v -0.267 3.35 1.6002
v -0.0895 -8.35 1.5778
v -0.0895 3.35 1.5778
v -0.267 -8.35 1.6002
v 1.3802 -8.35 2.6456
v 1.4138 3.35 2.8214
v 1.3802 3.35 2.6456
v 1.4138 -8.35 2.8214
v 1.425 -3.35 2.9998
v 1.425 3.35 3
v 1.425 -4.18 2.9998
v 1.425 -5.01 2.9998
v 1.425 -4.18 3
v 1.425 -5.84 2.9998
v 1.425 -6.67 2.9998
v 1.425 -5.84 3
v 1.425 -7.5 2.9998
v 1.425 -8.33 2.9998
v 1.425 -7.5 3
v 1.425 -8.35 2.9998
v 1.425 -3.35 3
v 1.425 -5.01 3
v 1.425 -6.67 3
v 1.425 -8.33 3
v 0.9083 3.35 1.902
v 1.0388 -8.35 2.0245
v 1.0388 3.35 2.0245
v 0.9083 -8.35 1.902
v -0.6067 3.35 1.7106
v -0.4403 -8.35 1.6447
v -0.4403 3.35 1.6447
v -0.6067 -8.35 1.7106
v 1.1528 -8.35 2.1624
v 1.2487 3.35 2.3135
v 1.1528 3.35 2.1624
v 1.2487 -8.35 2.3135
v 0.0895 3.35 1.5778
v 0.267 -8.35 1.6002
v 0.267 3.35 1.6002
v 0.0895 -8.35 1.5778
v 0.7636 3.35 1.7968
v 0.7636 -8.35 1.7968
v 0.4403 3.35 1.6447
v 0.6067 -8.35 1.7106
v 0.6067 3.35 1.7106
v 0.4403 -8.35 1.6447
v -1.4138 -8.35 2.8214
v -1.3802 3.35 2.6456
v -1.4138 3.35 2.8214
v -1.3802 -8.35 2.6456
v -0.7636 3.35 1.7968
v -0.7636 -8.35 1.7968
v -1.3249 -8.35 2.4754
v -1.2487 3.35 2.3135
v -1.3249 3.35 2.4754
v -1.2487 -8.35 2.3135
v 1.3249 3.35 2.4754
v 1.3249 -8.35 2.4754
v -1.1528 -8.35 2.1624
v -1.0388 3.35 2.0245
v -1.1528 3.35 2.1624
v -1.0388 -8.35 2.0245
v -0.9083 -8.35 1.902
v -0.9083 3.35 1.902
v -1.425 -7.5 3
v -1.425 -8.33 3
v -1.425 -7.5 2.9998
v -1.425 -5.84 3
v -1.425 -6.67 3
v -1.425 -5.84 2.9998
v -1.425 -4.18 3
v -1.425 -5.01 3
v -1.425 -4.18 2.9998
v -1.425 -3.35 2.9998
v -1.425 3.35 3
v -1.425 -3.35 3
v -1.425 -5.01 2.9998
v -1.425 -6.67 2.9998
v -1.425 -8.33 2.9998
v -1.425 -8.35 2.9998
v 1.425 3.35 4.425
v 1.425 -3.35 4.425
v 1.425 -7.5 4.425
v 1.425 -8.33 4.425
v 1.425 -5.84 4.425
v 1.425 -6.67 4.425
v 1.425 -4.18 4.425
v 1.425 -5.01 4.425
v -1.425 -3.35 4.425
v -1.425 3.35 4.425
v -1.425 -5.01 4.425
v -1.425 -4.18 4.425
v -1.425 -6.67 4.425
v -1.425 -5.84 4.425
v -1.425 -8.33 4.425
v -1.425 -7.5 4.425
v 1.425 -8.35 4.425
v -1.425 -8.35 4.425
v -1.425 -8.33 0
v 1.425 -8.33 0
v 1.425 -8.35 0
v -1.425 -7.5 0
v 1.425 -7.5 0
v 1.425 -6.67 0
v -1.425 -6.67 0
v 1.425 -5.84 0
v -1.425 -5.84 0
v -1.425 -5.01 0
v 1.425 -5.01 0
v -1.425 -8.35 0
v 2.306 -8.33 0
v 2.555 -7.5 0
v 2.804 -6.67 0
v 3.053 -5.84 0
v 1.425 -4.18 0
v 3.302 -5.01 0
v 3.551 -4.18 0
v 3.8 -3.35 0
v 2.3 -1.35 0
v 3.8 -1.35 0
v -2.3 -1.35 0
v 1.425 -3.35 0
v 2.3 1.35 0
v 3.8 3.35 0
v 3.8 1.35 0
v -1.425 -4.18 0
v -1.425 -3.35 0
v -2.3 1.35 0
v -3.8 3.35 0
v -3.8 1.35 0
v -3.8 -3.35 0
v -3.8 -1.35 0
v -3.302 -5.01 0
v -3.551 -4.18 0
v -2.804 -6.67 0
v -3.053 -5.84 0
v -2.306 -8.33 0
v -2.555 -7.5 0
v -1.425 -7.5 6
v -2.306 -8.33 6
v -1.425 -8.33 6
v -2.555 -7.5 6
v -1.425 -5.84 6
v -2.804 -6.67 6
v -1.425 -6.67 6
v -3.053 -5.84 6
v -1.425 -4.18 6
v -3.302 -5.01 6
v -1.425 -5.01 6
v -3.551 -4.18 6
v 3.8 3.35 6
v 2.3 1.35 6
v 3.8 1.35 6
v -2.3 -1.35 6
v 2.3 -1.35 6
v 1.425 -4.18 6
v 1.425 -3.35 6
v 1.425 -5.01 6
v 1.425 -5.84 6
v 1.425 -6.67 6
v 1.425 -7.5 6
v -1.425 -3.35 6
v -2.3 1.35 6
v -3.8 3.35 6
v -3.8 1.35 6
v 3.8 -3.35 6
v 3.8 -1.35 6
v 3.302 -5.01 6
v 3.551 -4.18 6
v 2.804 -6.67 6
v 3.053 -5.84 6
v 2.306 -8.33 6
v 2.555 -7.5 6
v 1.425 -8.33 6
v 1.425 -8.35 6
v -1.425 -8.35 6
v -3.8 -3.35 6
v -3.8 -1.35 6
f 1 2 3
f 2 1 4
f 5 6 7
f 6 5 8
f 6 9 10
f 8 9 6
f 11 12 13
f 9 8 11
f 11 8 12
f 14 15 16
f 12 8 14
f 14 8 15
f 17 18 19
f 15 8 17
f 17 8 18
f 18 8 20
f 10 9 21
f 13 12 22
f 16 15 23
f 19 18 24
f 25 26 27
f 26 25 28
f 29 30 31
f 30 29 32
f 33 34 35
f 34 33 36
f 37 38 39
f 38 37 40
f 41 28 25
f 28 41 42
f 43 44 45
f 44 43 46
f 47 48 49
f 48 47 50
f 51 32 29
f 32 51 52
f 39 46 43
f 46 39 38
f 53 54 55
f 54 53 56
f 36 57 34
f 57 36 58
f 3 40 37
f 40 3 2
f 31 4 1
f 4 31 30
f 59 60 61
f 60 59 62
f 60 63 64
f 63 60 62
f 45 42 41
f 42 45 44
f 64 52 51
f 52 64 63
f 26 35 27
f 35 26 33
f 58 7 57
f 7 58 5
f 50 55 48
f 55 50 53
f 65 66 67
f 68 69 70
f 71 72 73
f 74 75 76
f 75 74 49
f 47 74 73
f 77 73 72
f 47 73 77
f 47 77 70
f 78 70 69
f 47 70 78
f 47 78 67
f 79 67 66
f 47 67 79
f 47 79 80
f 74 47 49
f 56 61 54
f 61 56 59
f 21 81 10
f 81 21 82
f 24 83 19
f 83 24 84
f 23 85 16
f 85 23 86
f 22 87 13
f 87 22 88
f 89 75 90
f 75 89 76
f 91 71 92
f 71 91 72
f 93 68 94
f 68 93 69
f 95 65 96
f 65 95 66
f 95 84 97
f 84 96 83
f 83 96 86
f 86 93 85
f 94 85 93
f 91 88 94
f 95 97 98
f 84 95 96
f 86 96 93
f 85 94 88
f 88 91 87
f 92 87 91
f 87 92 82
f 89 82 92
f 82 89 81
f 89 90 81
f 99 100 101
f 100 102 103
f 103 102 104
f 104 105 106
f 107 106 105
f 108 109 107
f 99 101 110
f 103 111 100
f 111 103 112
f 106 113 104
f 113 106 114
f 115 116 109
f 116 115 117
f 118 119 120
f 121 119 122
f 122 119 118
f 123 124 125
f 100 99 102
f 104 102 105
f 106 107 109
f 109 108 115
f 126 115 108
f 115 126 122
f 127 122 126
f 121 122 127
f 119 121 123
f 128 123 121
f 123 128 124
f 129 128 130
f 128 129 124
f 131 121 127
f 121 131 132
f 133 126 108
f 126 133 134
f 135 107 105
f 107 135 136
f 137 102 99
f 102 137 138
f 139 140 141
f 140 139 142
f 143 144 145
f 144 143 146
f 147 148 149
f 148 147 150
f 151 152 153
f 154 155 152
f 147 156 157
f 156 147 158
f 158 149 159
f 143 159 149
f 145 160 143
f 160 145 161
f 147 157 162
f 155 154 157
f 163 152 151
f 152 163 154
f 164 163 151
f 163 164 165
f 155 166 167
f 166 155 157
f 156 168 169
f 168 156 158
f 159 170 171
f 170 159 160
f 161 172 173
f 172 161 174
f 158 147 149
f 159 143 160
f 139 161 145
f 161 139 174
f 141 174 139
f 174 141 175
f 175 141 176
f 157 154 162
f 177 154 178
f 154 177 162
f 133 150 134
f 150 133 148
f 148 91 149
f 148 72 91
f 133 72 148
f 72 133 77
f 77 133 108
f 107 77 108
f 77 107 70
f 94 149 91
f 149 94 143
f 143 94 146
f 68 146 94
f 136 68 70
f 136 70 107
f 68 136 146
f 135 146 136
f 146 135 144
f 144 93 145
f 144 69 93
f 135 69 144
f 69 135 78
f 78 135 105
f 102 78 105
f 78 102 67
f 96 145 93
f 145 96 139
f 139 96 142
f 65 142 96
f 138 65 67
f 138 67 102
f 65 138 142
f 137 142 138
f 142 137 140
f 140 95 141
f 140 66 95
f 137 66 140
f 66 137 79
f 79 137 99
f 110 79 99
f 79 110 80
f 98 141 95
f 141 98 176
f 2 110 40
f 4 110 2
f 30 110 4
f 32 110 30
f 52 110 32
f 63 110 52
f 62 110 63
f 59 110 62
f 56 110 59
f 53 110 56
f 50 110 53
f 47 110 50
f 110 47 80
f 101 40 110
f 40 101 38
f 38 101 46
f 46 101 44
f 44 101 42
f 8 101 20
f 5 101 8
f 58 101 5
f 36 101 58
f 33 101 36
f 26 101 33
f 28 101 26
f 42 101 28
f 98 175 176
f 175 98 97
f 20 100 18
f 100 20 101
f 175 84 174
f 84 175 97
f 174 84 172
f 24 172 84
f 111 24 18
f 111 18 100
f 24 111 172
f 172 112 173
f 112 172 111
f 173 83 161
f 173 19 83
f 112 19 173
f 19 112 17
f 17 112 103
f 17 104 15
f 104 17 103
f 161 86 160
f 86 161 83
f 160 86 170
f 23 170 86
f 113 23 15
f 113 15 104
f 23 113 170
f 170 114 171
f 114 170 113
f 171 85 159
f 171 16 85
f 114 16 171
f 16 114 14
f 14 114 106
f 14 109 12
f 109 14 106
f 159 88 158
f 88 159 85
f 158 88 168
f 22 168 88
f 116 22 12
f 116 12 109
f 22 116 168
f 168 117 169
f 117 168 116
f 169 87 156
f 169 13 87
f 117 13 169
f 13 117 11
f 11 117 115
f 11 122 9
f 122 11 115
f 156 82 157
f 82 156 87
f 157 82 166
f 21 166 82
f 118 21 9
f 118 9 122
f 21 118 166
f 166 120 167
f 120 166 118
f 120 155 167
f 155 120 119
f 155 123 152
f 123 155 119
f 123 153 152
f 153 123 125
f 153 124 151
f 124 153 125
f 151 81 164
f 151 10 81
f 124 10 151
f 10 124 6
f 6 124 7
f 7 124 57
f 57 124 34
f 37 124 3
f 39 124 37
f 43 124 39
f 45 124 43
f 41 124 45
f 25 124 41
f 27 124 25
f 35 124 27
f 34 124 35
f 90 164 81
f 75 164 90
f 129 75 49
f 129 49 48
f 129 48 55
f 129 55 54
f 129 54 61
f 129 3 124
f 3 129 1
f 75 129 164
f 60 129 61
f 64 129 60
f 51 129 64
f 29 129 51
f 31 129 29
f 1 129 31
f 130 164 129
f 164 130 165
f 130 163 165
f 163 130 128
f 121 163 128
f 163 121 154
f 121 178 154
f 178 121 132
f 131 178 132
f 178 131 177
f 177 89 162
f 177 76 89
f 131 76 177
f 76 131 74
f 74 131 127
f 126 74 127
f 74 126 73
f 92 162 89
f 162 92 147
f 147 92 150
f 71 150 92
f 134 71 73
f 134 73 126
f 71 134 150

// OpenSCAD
/* H-cable-strain-relief */


cableDia=2.85;
totalHght=6;
cntrWdth=4.6;
outrWdth=7.6;
ripThck=2;
ripSpcng=2.7;
tailLen=5;
sltWdth=0.83;
fudge=0.1;
$fn=50;

ovLen=ripThck*2+ripSpcng;
tailPoly=[[-outrWdth/2,0],[outrWdth/2,0],[cntrWdth/2,-tailLen],[-cntrWdth/2,-tailLen]];

difference(){
  linear_extrude(totalHght,convexity=4){
    difference(){
      union(){
        square([cntrWdth,ovLen],true);
        for (iy=[-1,1])
          translate([0,iy*(ripSpcng+ripThck)/2]) square([outrWdth,ripThck],true);
        //tail
        translate([0,-ovLen/2]) polygon(tailPoly);
      }
      for (i=[0:sltWdth*2:tailLen])
        translate([0,-ovLen/2-sltWdth/2-i]) square([outrWdth,sltWdth],true);
      }
      translate([0,-(ovLen+tailLen)/2]) square([cableDia,tailLen],true);
  }
  translate([0,-ovLen/2-tailLen-fudge/2,totalHght/2]) rotate([-90,0,0]){
    cylinder(d=cableDia,h=ovLen+tailLen+fudge);
    translate([0,-cableDia/4,(ovLen+tailLen+fudge)/2]) cube([cableDia,cableDia/2,ovLen+tailLen+fudge],true);
  }
  }
